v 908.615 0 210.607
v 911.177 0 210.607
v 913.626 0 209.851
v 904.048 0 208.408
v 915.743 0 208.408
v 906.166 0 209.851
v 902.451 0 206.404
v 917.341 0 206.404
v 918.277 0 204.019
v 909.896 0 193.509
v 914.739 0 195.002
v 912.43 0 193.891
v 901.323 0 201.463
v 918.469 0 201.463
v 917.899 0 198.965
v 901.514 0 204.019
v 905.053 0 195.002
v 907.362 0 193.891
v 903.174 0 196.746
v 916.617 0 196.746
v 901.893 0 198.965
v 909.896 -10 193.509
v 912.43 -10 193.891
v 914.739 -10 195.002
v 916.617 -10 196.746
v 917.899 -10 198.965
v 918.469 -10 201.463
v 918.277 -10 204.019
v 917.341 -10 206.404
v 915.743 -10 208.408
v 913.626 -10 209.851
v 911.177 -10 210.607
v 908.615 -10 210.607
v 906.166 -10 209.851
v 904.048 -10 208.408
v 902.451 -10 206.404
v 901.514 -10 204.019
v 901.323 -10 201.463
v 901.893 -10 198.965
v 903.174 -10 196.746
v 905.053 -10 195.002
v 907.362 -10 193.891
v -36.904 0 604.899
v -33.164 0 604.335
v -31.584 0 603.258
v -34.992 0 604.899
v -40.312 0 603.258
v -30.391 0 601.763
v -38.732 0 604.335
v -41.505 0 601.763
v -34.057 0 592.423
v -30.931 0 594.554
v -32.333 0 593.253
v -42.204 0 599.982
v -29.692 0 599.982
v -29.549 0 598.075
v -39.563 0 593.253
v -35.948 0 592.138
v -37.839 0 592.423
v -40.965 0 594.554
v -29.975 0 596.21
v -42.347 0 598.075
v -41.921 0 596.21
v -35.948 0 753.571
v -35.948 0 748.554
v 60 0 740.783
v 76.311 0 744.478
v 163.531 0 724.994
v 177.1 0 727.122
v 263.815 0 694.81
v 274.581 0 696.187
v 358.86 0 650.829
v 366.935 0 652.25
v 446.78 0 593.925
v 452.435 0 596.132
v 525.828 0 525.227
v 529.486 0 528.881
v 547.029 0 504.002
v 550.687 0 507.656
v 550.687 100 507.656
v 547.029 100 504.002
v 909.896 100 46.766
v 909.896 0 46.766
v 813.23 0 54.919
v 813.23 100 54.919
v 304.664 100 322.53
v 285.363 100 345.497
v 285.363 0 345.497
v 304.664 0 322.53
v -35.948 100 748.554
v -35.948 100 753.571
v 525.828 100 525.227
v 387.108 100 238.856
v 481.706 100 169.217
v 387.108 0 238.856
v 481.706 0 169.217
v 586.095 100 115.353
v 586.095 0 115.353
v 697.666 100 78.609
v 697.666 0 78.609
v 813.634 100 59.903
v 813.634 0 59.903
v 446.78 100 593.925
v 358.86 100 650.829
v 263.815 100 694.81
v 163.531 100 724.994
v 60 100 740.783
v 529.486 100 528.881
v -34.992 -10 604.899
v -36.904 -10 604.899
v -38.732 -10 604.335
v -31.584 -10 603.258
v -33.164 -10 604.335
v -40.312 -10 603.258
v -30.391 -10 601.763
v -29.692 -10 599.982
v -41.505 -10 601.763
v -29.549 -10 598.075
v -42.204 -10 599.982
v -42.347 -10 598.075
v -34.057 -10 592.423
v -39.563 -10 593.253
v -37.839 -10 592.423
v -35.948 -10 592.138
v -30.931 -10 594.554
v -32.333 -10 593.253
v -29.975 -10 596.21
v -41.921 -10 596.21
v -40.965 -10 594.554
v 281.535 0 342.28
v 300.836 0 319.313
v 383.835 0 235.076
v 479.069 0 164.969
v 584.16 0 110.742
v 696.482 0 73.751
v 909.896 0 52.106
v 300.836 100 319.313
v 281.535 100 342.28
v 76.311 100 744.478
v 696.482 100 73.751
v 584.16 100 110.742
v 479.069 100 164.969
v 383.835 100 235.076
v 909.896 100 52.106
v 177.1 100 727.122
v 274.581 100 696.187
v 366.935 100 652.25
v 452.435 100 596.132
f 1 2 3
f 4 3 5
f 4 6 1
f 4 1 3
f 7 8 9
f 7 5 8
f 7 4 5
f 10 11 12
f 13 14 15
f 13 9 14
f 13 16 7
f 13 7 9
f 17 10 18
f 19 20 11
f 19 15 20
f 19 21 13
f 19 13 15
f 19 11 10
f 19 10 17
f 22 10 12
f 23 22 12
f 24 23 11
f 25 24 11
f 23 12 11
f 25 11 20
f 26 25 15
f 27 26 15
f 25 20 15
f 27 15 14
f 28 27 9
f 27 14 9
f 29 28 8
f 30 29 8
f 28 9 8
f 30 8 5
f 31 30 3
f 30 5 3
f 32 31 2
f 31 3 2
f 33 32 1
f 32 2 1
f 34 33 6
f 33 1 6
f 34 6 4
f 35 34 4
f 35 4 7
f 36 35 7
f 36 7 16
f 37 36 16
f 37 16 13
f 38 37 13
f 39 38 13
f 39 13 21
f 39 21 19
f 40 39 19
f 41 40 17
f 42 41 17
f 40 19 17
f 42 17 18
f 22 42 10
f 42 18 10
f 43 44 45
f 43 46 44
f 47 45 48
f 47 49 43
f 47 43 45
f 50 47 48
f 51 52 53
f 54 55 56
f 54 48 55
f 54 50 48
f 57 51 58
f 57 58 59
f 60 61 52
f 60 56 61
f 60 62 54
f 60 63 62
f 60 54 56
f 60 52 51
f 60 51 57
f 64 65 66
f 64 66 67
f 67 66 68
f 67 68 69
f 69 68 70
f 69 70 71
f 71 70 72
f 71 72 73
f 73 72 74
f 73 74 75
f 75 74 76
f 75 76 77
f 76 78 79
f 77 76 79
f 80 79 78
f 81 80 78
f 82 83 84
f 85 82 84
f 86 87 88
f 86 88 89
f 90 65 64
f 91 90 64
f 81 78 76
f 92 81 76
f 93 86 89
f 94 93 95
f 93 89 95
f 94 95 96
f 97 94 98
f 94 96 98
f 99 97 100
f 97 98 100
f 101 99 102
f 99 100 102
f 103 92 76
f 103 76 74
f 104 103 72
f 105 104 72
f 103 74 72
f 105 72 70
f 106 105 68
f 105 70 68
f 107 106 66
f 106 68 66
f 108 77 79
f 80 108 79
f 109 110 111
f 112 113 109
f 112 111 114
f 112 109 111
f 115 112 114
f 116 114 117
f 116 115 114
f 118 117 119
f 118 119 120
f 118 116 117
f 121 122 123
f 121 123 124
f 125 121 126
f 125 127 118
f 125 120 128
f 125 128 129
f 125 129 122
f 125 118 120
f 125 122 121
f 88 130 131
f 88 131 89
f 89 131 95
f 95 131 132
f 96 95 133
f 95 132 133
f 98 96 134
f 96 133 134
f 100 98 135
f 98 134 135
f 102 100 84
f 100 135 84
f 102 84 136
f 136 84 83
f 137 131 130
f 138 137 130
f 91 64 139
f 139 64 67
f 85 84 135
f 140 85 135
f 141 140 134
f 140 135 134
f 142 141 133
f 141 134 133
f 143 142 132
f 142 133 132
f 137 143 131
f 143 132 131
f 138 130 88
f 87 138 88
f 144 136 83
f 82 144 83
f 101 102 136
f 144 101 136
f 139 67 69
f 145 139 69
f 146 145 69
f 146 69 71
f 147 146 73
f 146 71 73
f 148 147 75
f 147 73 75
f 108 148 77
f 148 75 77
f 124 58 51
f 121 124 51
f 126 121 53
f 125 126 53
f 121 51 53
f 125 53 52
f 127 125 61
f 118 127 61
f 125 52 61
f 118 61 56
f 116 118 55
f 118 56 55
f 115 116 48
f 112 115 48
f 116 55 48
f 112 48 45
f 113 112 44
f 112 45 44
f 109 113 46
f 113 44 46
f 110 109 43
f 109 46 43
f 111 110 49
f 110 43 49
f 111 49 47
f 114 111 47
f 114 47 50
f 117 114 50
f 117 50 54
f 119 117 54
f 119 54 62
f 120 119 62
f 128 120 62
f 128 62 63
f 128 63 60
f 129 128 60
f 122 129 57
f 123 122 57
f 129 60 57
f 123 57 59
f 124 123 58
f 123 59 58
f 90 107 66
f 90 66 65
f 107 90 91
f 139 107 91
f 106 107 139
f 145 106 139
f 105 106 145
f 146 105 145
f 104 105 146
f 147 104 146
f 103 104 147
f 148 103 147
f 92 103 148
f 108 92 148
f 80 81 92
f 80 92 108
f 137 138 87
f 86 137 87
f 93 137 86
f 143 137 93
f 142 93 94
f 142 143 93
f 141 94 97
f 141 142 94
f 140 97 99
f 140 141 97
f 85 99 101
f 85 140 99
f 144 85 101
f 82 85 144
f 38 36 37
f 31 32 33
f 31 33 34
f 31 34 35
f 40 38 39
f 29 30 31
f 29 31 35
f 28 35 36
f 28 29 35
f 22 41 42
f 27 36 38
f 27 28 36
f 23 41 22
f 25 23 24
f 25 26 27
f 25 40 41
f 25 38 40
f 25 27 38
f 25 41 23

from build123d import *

# Parameters (mm, degrees)
BOSS_EXTRUDE3_DEPTH   = 100
BOSS_EXTRUDE3_2_DEPTH = 100
SKETCH4_R             = 8.59707886
BOSS_EXTRUDE4_DEPTH   = 10
SKETCH4_R_2           = 6.416603948
BOSS_EXTRUDE4_2_DEPTH = 10
SKETCH5_R             = 6.416603948
BOSS_EXTRUDE5_DEPTH   = 10
SKETCH6_R             = 6.416603948
CUT_EXTRUDE1_DEPTH    = 10
SKETCH7_R             = 8.59707886
BOSS_EXTRUDE6_DEPTH   = 10
SKETCH8_R             = 8.59707886
CUT_EXTRUDE2_DEPTH    = 10


with BuildPart() as part:
    # Sketch1 → Boss-Extrude3 (new body)
    with BuildSketch(Plane(origin=(0, 0, 0), x_dir=(1, 0, 0), z_dir=(0, 1, 0))):
        with BuildLine():
            Line((300.836036259, -319.313164732), (281.535049643, -342.279921484))
            Line((281.535049643, -342.279921484), (285.362842435, -345.496752586))
            Line((285.362842435, -345.496752586), (304.663829051, -322.529995835))
            ThreePointArc((304.663829051, -322.529995835), (532.834524357, -140.219497818), (813.63368311, -59.90252372))
            Line((813.63368311, -59.90252372), (909.895902728, -52.105727748))
            Line((909.895902728, -52.105727748), (909.895902728, -46.76563371))
            Line((909.895902728, -46.76563371), (813.230028037, -54.918844097))
            ThreePointArc((813.230028037, -54.918844097), (530.541769207, -135.776157428), (300.836036259, -319.313164732))
        make_face()
    extrude(amount=BOSS_EXTRUDE3_DEPTH)


with BuildPart() as body_2:
    # Sketch1 → Boss-Extrude3 2 (new body)
    with BuildSketch(Plane(origin=(0, 0, 0), x_dir=(1, 0, 0), z_dir=(0, 1, 0))):
        with BuildLine():
            Line((529.486382869, -528.881166176), (550.687452284, -507.655835657))
            Line((550.687452284, -507.655835657), (547.029480395, -504.002044924))
            Line((547.029480395, -504.002044924), (525.82841098, -525.227375443))
            ThreePointArc((525.82841098, -525.227375443), (312.113406405, -674.495763701), (60, -740.782905924))
            Line((60, -740.782905924), (-35.948012473, -748.554252566))
            Line((-35.948012473, -748.554252566), (-35.948012473, -753.570626388))
            Line((-35.948012473, -753.570626388), (76.311382936, -744.478132932))
            ThreePointArc((76.311382936, -744.478132932), (321.509325343, -675.797951534), (529.486382869, -528.881166176))
        make_face()
    extrude(amount=BOSS_EXTRUDE3_2_DEPTH)


with BuildPart() as body_3:
    # Sketch4 → Boss-Extrude4 (new body)
    with BuildSketch(Plane.XZ):
        with Locations(Location((909.895902728, 202.105727748, 0), (0, 0, 270))):
            Circle(SKETCH4_R)
    extrude(amount=-BOSS_EXTRUDE4_DEPTH)

    # Sketch7 → Boss-Extrude6 (add)
    with BuildSketch(Plane.XZ):
        with Locations(Location((909.895902728, 202.105727748, 0), (0, 0, 270))):
            Circle(SKETCH7_R)
    extrude(amount=BOSS_EXTRUDE6_DEPTH)

    # Sketch8 → Cut-Extrude2 (cut)
    with BuildSketch(Plane(origin=(0, 10, 0), x_dir=(1, 0, 0), z_dir=(0, 1, 0))):
        with Locations(Location((909.895902728, -202.105727748, 0), (0, 0, 90))):
            Circle(SKETCH8_R)
    extrude(amount=-CUT_EXTRUDE2_DEPTH, mode=Mode.SUBTRACT)


with BuildPart() as body_4:
    # Sketch4 → Boss-Extrude4 2 (new body)
    with BuildSketch(Plane.XZ):
        with Locations(Location((-35.948012473, 598.554252566, 0), (0, 0, 270))):
            Circle(SKETCH4_R_2)
    extrude(amount=-BOSS_EXTRUDE4_2_DEPTH)

    # Sketch5 → Boss-Extrude5 (add)
    with BuildSketch(Plane.XZ):
        with Locations(Location((-35.948012473, 598.554252566, 0), (0, 0, 270))):
            Circle(SKETCH5_R)
    extrude(amount=BOSS_EXTRUDE5_DEPTH)

    # Sketch6 → Cut-Extrude1 (cut)
    with BuildSketch(Plane(origin=(0, 10, 0), x_dir=(1, 0, 0), z_dir=(0, 1, 0))):
        with Locations(Location((-35.948012473, -598.554252566, 0), (0, 0, 90))):
            Circle(SKETCH6_R)
    extrude(amount=-CUT_EXTRUDE1_DEPTH, mode=Mode.SUBTRACT)


solid = Compound([part.part, body_2.part, body_3.part, body_4.part])
